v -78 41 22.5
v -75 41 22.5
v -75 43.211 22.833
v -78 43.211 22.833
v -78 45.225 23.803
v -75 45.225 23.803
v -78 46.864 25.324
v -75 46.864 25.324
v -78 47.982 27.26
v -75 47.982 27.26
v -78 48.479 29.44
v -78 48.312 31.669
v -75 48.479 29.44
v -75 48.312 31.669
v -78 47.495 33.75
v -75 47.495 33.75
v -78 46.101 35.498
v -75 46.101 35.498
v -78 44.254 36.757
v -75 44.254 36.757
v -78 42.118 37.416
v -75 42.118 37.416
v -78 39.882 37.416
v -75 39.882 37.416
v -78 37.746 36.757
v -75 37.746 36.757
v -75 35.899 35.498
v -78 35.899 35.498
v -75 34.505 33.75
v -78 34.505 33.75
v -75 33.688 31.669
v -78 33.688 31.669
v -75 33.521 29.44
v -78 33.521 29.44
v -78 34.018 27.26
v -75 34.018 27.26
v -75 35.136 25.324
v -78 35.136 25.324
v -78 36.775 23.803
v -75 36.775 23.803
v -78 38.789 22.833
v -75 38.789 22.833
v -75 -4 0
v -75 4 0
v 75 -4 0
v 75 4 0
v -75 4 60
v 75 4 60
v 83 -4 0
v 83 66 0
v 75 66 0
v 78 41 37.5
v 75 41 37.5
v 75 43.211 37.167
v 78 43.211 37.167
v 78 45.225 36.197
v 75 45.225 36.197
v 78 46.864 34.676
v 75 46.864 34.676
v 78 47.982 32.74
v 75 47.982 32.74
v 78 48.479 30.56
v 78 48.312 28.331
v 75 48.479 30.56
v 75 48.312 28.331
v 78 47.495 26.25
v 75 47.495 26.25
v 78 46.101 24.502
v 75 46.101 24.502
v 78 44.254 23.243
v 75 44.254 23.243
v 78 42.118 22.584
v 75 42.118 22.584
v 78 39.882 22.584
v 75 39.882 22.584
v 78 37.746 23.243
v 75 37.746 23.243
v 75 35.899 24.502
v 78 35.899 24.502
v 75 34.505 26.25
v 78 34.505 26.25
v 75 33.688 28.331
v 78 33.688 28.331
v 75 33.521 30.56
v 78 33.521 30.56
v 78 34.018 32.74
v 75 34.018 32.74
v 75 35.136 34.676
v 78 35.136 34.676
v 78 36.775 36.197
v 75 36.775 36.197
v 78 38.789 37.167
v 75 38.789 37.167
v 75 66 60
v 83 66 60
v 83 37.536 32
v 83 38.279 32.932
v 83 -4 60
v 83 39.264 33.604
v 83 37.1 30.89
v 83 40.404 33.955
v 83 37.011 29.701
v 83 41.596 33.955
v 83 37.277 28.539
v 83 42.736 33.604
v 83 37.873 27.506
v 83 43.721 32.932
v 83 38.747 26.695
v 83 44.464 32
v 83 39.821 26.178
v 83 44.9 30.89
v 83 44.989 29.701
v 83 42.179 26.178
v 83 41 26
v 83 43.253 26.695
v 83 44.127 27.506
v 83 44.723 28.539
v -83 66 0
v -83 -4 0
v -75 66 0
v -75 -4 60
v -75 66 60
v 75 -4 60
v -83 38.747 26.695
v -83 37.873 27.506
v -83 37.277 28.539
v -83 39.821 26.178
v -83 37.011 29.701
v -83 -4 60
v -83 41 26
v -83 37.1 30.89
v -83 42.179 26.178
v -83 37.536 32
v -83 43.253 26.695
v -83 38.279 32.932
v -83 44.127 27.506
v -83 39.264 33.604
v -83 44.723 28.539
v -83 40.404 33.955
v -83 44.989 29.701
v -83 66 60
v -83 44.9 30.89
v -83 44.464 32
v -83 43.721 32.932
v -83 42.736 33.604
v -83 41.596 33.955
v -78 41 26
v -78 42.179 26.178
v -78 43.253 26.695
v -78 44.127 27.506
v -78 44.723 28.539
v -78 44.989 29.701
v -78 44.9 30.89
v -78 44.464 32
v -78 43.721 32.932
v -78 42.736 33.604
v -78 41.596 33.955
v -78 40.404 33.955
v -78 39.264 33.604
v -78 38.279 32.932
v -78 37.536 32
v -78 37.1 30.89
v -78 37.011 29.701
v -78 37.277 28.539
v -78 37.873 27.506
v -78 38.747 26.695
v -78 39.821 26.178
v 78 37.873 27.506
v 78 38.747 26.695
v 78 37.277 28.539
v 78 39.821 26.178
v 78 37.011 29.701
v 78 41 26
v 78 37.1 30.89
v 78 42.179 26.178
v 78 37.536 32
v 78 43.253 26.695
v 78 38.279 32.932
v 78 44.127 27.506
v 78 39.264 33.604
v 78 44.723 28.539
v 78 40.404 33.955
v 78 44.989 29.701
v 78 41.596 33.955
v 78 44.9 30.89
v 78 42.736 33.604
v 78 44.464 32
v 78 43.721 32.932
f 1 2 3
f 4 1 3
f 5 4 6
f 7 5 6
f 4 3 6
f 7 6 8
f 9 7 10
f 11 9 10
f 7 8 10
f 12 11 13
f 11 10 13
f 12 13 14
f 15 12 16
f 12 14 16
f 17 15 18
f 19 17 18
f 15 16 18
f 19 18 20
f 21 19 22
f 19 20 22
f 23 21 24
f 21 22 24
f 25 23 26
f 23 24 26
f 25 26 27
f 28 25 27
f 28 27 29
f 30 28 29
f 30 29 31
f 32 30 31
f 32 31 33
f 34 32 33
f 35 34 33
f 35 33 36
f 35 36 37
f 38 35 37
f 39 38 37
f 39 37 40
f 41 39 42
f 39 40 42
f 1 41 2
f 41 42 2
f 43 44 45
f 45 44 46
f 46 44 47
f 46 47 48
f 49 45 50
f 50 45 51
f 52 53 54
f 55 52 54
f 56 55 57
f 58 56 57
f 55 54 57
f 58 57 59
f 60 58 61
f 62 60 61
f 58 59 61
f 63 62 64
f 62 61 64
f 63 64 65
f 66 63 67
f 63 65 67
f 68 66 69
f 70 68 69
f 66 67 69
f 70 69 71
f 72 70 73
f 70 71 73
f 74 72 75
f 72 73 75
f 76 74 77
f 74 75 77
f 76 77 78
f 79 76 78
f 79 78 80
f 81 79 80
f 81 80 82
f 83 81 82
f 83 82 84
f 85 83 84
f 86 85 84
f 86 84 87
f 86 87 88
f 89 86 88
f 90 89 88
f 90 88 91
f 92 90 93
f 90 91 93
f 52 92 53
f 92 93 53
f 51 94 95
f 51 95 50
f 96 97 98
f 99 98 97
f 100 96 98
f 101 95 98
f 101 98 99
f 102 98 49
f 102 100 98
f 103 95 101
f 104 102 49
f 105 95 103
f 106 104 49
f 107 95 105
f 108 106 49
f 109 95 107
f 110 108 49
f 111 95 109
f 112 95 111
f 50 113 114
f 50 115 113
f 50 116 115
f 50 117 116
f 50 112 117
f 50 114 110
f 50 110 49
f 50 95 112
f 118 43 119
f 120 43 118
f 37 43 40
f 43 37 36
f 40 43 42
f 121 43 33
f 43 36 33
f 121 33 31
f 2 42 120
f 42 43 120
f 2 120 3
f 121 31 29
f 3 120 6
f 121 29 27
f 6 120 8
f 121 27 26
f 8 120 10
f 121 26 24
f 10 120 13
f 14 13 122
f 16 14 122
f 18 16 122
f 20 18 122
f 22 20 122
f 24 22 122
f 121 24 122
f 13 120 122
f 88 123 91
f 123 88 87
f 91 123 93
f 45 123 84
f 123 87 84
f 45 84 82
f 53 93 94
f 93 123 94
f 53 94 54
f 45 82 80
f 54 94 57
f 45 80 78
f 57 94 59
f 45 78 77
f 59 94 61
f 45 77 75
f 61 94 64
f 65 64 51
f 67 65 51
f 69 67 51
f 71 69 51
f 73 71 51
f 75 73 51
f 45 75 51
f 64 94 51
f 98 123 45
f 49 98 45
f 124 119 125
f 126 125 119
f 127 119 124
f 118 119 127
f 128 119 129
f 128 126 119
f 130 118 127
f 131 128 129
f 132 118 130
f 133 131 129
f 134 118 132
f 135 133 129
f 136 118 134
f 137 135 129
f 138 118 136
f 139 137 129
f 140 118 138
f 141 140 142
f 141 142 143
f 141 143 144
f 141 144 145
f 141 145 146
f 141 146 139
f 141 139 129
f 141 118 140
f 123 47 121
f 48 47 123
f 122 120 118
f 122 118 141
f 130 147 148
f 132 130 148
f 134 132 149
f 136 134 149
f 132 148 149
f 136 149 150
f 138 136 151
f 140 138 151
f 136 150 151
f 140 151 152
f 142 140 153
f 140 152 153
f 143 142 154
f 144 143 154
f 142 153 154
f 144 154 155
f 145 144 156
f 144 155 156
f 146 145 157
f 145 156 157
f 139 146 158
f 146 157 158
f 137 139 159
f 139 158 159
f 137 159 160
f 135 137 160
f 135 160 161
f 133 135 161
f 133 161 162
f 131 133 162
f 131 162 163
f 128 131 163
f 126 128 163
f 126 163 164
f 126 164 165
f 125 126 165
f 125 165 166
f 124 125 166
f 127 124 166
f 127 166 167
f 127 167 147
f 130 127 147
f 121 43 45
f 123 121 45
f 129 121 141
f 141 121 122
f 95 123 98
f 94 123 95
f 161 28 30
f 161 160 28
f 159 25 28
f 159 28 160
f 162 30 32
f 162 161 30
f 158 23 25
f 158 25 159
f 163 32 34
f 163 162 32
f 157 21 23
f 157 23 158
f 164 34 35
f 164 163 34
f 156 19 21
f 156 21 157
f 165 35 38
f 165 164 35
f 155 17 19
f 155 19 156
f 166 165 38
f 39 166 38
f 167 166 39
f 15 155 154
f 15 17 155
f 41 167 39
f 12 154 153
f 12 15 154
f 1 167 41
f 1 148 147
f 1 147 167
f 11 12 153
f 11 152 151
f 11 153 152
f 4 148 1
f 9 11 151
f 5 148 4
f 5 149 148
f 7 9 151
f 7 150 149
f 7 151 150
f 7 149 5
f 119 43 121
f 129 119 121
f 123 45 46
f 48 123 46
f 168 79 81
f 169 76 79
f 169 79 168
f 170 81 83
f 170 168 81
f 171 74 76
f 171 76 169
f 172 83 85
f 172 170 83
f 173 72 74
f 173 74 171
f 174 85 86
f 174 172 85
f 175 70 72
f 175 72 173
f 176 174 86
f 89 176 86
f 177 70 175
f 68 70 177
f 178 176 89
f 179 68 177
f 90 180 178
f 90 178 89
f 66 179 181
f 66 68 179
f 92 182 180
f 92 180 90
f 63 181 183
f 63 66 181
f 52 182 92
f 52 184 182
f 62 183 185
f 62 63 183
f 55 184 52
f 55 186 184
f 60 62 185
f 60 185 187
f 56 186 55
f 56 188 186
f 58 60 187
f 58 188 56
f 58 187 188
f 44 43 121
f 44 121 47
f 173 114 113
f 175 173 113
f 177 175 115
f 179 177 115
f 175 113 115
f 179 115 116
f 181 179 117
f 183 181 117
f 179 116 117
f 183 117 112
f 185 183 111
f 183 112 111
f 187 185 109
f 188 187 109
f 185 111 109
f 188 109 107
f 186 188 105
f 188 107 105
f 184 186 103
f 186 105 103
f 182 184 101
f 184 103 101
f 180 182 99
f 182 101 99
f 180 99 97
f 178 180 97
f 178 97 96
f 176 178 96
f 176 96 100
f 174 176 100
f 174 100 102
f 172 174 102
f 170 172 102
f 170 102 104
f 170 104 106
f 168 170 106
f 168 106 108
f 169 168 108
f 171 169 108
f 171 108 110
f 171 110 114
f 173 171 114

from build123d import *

# Parameters (mm, degrees)
SKETCH1_W           = 150
SKETCH1_H           = 8
BOSS_EXTRUDE1_DEPTH = 60
SKETCH2_W           = 60
SKETCH2_H           = 70
BOSS_EXTRUDE2_DEPTH = 8
SKETCH3_W           = 60
SKETCH3_H           = 70
BOSS_EXTRUDE3_DEPTH = 8
SKETCH4_R           = 4
CUT_EXTRUDE1_DEPTH  = 189.446278817
SKETCH5_R           = 7.5
CUT_EXTRUDE2_DEPTH  = 3
SKETCH6_R           = 7.5
CUT_EXTRUDE3_DEPTH  = 3


with BuildPart() as part:
    # Sketch1 → Boss-Extrude1 (new body)
    with BuildSketch(Plane.XY):
        Rectangle(SKETCH1_W, SKETCH1_H)
    extrude(amount=BOSS_EXTRUDE1_DEPTH)


with BuildPart() as body_2:
    # Sketch2 → Boss-Extrude2 (new body)
    with BuildSketch(Plane(origin=(75, 0, 0), x_dir=(0, 0, -1), z_dir=(1, 0, 0))):
        with Locations((-30, 31)):
            Rectangle(SKETCH2_W, SKETCH2_H)
    extrude(amount=BOSS_EXTRUDE2_DEPTH)


with BuildPart() as body_3:
    # Sketch3 → Boss-Extrude3 (new body)
    with BuildSketch(Plane.ZY.offset(75)):
        with Locations((30, 31)):
            Rectangle(SKETCH3_W, SKETCH3_H)
    extrude(amount=BOSS_EXTRUDE3_DEPTH)


with BuildPart() as cut_extrude1_tool:
    # Sketch4 → Cut-Extrude1 (new, through all)
    with BuildSketch(Plane(origin=(83, 0, 0), x_dir=(0, 0, -1), z_dir=(1, 0, 0))):
        with Locations((-30, 41)):
            Circle(SKETCH4_R)
    extrude(amount=-CUT_EXTRUDE1_DEPTH)


with BuildPart() as body_2_1:
    add(body_2.part)

    # Cut-Extrude1: cut by cut_extrude1_tool
    add(cut_extrude1_tool.part, mode=Mode.SUBTRACT)

    # Sketch5 → Cut-Extrude2 (cut)
    with BuildSketch(Plane.ZY.offset(-75)):
        with Locations((30, 41)):
            Circle(SKETCH5_R)
    extrude(amount=-CUT_EXTRUDE2_DEPTH, mode=Mode.SUBTRACT)


with BuildPart() as body_3_1:
    add(body_3.part)

    # Cut-Extrude1: cut by cut_extrude1_tool
    add(cut_extrude1_tool.part, mode=Mode.SUBTRACT)

    # Sketch6 → Cut-Extrude3 (cut)
    with BuildSketch(Plane(origin=(-75, 0, 0), x_dir=(0, 0, -1), z_dir=(1, 0, 0))):
        with Locations((-30, 41)):
            Circle(SKETCH6_R)
    extrude(amount=-CUT_EXTRUDE3_DEPTH, mode=Mode.SUBTRACT)


solid = Compound([part.part, body_2_1.part, body_3_1.part])
